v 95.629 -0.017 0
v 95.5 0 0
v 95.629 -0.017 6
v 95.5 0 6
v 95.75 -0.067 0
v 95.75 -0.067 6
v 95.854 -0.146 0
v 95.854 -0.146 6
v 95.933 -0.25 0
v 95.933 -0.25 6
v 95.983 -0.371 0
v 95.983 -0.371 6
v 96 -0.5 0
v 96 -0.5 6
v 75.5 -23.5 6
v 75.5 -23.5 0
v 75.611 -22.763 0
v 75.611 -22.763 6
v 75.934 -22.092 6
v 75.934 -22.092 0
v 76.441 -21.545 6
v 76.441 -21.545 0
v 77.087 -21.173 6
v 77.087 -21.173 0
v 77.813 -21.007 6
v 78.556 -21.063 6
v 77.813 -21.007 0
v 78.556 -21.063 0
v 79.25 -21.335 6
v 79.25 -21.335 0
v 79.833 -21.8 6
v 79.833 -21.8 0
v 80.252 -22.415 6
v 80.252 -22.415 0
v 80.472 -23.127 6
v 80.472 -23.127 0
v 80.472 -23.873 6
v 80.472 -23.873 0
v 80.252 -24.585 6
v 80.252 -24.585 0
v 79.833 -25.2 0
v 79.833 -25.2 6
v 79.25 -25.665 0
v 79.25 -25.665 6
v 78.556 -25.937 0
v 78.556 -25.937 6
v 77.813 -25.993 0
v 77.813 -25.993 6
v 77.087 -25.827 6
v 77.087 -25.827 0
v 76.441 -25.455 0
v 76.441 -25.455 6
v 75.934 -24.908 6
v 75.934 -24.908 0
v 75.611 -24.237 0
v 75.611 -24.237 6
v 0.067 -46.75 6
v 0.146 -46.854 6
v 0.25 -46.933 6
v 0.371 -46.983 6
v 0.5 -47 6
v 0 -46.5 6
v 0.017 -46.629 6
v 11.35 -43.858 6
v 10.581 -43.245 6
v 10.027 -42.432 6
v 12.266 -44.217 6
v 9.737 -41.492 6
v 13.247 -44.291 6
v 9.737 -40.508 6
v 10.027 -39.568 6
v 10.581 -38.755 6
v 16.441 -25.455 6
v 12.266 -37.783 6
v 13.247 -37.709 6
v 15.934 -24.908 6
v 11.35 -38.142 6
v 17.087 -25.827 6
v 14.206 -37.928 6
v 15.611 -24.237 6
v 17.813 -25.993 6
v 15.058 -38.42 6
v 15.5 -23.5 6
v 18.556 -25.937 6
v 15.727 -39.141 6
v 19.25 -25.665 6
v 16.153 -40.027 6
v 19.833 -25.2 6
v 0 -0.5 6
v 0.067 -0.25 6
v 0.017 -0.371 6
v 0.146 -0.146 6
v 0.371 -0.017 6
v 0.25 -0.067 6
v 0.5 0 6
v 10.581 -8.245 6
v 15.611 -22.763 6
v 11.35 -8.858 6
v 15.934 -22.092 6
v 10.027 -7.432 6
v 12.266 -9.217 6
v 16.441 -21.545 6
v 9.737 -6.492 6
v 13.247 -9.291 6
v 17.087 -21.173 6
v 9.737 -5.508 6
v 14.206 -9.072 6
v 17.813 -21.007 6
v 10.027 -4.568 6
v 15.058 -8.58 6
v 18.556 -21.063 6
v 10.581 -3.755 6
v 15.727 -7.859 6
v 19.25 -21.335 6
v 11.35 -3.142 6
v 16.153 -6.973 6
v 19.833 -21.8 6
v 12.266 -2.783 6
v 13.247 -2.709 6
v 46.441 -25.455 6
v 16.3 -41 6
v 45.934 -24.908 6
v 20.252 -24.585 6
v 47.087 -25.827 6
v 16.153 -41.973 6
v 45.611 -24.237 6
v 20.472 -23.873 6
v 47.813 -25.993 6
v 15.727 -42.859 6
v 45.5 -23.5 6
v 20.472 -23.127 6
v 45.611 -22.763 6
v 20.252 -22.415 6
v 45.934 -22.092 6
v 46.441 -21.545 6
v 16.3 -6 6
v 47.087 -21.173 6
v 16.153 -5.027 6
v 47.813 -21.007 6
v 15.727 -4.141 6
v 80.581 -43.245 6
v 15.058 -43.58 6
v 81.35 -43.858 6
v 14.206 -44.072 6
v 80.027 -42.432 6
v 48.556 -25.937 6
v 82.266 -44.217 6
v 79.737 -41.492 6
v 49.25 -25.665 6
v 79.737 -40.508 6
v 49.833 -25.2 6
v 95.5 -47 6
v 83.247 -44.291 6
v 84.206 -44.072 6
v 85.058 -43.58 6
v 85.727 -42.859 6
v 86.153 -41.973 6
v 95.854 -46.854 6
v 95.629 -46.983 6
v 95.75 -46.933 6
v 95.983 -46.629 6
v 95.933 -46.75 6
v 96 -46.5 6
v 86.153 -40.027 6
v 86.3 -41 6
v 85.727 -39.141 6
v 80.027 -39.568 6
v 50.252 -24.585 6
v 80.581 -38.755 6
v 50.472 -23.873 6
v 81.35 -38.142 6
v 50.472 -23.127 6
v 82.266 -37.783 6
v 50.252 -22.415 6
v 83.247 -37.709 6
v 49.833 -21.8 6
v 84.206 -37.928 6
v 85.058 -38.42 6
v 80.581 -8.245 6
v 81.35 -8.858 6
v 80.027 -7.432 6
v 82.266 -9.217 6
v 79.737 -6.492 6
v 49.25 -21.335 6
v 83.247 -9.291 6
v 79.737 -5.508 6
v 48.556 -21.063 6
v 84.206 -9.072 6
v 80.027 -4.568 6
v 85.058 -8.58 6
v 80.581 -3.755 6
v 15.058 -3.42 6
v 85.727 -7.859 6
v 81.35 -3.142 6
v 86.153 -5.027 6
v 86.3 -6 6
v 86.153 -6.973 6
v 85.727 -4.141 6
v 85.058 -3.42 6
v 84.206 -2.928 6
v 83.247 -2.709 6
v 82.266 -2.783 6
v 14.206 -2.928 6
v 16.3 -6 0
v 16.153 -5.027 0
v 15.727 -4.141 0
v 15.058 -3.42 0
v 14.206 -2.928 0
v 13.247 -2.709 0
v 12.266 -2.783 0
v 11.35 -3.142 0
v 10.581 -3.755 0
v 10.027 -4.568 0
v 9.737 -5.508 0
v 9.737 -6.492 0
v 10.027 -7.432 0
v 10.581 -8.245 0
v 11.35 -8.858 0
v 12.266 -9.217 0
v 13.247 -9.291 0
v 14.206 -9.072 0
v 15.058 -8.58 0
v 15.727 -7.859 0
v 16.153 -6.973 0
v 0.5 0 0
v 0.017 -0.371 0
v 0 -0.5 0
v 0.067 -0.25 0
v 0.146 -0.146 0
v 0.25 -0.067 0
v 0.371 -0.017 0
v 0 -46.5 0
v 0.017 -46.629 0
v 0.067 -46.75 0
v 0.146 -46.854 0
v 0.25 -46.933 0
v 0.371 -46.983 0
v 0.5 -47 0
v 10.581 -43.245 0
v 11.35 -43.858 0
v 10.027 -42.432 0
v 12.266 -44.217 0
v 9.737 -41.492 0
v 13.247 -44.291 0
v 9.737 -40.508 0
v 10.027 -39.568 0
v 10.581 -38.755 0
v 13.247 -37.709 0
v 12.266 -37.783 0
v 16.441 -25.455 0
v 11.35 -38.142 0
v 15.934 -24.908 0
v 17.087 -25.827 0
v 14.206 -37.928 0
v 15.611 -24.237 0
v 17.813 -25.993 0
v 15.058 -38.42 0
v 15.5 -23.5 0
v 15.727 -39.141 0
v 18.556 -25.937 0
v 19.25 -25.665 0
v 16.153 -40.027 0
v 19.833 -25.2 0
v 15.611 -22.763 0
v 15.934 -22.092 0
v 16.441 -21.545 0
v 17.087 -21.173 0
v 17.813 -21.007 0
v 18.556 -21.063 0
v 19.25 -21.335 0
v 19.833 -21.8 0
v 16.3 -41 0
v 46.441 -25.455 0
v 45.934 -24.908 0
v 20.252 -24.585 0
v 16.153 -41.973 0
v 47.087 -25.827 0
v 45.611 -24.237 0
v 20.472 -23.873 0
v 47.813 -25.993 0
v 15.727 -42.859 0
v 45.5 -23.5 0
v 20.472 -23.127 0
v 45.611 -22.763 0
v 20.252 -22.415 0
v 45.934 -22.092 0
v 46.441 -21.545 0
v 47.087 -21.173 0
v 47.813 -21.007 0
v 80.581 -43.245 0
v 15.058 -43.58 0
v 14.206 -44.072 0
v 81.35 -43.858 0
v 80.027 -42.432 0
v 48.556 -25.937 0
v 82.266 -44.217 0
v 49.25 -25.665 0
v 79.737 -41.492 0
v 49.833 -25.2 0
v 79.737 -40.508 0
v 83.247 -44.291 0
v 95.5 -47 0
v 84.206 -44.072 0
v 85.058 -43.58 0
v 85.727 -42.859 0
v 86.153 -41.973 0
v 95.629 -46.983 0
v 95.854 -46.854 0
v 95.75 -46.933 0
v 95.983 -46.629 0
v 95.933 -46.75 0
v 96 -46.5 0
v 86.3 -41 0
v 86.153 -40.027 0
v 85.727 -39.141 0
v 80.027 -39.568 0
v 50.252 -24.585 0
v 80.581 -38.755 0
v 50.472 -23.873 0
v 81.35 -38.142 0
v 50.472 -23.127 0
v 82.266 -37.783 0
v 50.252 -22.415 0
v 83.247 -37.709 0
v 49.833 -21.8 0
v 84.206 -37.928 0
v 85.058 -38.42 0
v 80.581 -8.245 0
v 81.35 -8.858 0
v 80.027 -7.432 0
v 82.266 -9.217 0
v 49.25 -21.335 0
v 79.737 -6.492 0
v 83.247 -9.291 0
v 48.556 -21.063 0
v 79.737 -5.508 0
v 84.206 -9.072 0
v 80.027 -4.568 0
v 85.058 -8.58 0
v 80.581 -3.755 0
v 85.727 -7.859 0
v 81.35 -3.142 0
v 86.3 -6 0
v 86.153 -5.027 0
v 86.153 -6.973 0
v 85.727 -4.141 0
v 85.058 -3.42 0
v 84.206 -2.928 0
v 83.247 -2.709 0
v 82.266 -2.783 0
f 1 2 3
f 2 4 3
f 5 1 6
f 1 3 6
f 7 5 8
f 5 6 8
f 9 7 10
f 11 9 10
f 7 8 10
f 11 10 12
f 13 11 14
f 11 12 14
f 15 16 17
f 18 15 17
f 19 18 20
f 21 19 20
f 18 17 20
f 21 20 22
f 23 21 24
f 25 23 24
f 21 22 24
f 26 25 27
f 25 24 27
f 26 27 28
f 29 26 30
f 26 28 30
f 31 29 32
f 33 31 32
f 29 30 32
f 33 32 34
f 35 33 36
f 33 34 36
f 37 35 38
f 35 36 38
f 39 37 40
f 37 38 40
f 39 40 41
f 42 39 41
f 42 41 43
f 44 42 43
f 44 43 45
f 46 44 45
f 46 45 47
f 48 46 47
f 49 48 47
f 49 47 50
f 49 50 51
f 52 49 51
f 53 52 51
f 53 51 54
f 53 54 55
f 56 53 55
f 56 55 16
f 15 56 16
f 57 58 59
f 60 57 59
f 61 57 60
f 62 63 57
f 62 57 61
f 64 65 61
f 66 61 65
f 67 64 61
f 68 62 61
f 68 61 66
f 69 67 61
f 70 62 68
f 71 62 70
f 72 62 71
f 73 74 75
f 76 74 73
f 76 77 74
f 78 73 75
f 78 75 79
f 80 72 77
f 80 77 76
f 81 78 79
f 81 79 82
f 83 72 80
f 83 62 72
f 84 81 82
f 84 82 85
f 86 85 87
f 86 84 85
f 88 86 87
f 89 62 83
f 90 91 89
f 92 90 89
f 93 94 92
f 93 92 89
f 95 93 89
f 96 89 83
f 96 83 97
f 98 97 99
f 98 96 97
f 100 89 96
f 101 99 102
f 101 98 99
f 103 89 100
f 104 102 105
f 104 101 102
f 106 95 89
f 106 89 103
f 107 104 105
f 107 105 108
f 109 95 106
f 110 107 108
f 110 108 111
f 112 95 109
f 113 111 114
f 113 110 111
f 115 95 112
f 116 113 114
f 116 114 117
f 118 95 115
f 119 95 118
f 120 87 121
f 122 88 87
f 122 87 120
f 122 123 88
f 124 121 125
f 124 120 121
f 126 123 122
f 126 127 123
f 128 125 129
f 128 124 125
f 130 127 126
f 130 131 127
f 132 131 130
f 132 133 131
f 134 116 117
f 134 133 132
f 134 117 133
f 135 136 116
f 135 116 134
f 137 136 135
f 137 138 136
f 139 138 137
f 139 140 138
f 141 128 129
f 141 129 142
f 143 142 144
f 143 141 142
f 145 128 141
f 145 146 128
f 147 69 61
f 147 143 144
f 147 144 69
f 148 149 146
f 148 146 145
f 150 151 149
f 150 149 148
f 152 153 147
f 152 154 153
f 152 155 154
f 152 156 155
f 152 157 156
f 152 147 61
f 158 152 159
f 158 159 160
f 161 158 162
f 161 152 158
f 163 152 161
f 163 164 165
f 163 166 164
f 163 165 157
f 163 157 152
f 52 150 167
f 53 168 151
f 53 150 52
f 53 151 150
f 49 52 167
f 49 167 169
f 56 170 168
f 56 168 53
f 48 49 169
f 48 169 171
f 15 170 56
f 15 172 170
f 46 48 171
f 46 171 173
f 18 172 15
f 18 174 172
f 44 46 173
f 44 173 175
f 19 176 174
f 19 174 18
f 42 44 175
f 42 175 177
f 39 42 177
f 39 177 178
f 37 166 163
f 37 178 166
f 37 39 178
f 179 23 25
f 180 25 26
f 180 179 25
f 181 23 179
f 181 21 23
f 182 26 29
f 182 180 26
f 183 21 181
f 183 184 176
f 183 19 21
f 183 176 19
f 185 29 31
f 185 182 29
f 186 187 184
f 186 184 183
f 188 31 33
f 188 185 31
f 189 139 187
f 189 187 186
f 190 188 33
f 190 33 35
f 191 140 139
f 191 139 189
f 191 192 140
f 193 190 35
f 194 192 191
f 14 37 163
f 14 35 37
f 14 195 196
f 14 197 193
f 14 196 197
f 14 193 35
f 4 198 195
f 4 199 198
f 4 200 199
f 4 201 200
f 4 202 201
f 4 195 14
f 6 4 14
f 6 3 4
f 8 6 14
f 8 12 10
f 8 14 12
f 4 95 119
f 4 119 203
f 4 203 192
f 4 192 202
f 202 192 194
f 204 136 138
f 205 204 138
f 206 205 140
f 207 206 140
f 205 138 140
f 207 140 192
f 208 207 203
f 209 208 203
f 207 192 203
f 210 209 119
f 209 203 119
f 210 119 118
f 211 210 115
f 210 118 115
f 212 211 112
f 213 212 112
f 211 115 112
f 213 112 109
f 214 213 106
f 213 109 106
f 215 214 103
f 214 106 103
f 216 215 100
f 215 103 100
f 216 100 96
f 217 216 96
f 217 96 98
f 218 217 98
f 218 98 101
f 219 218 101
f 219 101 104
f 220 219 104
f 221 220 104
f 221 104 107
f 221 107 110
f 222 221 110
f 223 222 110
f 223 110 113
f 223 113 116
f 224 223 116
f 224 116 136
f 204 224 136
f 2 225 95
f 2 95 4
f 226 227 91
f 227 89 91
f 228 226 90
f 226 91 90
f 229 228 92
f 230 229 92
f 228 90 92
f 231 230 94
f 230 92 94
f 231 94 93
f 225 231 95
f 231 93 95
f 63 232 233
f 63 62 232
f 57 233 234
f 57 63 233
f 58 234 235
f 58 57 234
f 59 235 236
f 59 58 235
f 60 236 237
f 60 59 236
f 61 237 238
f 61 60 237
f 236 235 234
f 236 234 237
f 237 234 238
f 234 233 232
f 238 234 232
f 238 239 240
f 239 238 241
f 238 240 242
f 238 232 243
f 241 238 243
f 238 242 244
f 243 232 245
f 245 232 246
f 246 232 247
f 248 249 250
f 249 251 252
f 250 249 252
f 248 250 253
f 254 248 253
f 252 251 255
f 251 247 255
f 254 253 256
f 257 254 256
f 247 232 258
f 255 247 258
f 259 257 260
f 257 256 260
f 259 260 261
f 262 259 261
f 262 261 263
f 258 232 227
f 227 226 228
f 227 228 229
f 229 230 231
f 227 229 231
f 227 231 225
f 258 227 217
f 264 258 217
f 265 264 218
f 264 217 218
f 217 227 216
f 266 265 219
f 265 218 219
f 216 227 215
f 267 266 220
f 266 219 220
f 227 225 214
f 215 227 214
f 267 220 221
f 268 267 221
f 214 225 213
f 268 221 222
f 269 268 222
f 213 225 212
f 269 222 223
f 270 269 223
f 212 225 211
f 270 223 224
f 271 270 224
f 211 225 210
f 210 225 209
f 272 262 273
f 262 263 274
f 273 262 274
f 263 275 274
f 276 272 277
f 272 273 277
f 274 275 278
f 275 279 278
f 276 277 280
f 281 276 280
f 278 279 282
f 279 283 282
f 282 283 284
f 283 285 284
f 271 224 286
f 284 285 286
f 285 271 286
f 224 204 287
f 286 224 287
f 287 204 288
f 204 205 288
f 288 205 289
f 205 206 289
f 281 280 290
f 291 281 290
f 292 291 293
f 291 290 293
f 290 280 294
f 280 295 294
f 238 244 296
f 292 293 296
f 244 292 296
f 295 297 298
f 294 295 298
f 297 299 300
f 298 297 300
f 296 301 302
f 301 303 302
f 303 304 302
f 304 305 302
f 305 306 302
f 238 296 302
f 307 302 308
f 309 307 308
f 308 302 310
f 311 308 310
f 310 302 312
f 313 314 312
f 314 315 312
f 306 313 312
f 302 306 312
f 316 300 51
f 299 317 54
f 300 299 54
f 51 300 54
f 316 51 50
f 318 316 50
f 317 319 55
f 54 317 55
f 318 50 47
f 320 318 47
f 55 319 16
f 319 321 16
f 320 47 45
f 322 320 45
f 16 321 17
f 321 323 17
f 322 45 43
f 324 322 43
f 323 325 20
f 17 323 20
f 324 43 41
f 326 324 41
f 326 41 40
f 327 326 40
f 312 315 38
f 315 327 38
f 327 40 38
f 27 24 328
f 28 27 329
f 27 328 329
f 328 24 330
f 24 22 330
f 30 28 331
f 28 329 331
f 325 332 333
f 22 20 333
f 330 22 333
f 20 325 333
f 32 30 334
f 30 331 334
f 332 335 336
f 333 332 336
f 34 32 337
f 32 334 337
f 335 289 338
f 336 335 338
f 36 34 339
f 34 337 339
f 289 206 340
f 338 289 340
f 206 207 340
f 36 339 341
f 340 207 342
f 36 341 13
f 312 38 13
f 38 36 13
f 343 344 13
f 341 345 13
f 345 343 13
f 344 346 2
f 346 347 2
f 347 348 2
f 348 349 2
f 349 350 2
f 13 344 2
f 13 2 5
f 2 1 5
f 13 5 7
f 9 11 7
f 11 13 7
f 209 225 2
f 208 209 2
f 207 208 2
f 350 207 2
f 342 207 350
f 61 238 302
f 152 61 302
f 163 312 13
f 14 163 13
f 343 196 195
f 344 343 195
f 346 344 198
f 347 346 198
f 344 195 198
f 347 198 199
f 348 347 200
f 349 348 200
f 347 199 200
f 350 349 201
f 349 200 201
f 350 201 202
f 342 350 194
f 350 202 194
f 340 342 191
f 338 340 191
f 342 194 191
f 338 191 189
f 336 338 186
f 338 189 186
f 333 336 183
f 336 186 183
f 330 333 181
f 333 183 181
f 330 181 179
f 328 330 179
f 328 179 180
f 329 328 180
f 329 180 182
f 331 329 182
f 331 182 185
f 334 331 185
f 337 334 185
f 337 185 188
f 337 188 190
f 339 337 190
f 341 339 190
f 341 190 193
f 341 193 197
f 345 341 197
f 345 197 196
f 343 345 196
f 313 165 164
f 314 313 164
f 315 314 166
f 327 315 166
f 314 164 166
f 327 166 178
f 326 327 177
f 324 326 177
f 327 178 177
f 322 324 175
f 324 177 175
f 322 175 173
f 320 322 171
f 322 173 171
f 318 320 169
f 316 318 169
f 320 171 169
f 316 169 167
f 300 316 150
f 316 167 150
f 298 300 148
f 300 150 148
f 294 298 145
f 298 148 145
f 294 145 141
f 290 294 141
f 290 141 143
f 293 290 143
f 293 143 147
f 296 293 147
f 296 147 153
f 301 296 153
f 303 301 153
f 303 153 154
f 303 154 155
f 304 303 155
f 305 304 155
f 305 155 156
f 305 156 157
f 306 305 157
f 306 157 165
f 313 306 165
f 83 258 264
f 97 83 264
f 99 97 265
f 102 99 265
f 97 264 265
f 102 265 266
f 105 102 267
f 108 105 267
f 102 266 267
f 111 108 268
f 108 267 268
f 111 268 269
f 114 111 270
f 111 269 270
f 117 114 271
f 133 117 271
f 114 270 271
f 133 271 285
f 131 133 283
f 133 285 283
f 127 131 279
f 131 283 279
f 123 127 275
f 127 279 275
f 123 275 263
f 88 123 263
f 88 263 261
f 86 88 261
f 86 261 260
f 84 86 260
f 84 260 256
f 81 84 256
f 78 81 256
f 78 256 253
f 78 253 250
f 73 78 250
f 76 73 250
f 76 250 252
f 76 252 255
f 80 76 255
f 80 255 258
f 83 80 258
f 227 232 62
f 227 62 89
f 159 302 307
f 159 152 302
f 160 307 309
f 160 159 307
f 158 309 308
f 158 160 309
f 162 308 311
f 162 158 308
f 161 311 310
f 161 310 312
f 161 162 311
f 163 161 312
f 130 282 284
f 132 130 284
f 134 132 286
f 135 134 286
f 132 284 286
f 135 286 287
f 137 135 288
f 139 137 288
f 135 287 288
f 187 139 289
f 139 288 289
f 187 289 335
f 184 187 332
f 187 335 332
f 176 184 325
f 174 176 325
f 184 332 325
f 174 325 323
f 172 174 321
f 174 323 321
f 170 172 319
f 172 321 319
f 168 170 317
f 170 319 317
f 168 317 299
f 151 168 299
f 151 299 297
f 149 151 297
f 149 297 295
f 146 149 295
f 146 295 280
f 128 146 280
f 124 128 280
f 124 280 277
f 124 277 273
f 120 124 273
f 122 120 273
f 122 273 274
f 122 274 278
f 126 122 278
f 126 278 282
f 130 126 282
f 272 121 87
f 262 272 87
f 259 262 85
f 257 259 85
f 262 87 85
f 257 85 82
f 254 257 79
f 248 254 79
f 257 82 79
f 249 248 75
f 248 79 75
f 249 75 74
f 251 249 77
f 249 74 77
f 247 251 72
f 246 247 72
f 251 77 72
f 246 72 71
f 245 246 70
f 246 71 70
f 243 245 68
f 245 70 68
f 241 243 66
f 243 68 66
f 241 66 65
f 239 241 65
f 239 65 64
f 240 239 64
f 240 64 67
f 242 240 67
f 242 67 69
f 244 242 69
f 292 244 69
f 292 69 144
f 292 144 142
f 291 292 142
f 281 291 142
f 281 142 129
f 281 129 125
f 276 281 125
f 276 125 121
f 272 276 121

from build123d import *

# Parameters (mm, degrees)
SKETCH_1_W          = 96
SKETCH_1_H          = 47
EXTRUDE_1_DEPTH     = 6
SKETCH_2_R          = 3.3
CUT_EXTRUDE_1_DEPTH = 10
HOLE_WIZARD_M6_2_D  = 5
FILLET_1_R          = 0.5


with BuildPart() as part:
    # 草图1 → 凸台-拉伸1 (new body)
    with BuildSketch(Plane.XY):
        with Locations((48, -23.5)):
            Rectangle(SKETCH_1_W, SKETCH_1_H)
    extrude(amount=EXTRUDE_1_DEPTH)

    # 草图2 → 切除-拉伸1 (cut)
    with BuildSketch(Plane.XY.offset(6)):
        with Locations((83, -6)):
            Circle(SKETCH_2_R)
        with Locations((83, -41)):
            Circle(SKETCH_2_R)
        with Locations((13, -41)):
            Circle(SKETCH_2_R)
        with Locations((13, -6)):
            Circle(SKETCH_2_R)
    extrude(amount=-CUT_EXTRUDE_1_DEPTH, mode=Mode.SUBTRACT)

    # M6 螺纹孔2 (through all)
    with Locations(Plane.XY.offset(6)):
        with Locations((18, -23.5), (48, -23.5), (78, -23.5)):
            Hole(HOLE_WIZARD_M6_2_D / 2)

    # 圆角1
    fillet_1_edges = [part.edges().sort_by_distance(p)[0] for p in [
        (0, 0, 3),
        (96, 0, 3),
        (96, -47, 3),
        (0, -47, 3),
    ]]
    fillet(fillet_1_edges, radius=FILLET_1_R)


solid = part.part
